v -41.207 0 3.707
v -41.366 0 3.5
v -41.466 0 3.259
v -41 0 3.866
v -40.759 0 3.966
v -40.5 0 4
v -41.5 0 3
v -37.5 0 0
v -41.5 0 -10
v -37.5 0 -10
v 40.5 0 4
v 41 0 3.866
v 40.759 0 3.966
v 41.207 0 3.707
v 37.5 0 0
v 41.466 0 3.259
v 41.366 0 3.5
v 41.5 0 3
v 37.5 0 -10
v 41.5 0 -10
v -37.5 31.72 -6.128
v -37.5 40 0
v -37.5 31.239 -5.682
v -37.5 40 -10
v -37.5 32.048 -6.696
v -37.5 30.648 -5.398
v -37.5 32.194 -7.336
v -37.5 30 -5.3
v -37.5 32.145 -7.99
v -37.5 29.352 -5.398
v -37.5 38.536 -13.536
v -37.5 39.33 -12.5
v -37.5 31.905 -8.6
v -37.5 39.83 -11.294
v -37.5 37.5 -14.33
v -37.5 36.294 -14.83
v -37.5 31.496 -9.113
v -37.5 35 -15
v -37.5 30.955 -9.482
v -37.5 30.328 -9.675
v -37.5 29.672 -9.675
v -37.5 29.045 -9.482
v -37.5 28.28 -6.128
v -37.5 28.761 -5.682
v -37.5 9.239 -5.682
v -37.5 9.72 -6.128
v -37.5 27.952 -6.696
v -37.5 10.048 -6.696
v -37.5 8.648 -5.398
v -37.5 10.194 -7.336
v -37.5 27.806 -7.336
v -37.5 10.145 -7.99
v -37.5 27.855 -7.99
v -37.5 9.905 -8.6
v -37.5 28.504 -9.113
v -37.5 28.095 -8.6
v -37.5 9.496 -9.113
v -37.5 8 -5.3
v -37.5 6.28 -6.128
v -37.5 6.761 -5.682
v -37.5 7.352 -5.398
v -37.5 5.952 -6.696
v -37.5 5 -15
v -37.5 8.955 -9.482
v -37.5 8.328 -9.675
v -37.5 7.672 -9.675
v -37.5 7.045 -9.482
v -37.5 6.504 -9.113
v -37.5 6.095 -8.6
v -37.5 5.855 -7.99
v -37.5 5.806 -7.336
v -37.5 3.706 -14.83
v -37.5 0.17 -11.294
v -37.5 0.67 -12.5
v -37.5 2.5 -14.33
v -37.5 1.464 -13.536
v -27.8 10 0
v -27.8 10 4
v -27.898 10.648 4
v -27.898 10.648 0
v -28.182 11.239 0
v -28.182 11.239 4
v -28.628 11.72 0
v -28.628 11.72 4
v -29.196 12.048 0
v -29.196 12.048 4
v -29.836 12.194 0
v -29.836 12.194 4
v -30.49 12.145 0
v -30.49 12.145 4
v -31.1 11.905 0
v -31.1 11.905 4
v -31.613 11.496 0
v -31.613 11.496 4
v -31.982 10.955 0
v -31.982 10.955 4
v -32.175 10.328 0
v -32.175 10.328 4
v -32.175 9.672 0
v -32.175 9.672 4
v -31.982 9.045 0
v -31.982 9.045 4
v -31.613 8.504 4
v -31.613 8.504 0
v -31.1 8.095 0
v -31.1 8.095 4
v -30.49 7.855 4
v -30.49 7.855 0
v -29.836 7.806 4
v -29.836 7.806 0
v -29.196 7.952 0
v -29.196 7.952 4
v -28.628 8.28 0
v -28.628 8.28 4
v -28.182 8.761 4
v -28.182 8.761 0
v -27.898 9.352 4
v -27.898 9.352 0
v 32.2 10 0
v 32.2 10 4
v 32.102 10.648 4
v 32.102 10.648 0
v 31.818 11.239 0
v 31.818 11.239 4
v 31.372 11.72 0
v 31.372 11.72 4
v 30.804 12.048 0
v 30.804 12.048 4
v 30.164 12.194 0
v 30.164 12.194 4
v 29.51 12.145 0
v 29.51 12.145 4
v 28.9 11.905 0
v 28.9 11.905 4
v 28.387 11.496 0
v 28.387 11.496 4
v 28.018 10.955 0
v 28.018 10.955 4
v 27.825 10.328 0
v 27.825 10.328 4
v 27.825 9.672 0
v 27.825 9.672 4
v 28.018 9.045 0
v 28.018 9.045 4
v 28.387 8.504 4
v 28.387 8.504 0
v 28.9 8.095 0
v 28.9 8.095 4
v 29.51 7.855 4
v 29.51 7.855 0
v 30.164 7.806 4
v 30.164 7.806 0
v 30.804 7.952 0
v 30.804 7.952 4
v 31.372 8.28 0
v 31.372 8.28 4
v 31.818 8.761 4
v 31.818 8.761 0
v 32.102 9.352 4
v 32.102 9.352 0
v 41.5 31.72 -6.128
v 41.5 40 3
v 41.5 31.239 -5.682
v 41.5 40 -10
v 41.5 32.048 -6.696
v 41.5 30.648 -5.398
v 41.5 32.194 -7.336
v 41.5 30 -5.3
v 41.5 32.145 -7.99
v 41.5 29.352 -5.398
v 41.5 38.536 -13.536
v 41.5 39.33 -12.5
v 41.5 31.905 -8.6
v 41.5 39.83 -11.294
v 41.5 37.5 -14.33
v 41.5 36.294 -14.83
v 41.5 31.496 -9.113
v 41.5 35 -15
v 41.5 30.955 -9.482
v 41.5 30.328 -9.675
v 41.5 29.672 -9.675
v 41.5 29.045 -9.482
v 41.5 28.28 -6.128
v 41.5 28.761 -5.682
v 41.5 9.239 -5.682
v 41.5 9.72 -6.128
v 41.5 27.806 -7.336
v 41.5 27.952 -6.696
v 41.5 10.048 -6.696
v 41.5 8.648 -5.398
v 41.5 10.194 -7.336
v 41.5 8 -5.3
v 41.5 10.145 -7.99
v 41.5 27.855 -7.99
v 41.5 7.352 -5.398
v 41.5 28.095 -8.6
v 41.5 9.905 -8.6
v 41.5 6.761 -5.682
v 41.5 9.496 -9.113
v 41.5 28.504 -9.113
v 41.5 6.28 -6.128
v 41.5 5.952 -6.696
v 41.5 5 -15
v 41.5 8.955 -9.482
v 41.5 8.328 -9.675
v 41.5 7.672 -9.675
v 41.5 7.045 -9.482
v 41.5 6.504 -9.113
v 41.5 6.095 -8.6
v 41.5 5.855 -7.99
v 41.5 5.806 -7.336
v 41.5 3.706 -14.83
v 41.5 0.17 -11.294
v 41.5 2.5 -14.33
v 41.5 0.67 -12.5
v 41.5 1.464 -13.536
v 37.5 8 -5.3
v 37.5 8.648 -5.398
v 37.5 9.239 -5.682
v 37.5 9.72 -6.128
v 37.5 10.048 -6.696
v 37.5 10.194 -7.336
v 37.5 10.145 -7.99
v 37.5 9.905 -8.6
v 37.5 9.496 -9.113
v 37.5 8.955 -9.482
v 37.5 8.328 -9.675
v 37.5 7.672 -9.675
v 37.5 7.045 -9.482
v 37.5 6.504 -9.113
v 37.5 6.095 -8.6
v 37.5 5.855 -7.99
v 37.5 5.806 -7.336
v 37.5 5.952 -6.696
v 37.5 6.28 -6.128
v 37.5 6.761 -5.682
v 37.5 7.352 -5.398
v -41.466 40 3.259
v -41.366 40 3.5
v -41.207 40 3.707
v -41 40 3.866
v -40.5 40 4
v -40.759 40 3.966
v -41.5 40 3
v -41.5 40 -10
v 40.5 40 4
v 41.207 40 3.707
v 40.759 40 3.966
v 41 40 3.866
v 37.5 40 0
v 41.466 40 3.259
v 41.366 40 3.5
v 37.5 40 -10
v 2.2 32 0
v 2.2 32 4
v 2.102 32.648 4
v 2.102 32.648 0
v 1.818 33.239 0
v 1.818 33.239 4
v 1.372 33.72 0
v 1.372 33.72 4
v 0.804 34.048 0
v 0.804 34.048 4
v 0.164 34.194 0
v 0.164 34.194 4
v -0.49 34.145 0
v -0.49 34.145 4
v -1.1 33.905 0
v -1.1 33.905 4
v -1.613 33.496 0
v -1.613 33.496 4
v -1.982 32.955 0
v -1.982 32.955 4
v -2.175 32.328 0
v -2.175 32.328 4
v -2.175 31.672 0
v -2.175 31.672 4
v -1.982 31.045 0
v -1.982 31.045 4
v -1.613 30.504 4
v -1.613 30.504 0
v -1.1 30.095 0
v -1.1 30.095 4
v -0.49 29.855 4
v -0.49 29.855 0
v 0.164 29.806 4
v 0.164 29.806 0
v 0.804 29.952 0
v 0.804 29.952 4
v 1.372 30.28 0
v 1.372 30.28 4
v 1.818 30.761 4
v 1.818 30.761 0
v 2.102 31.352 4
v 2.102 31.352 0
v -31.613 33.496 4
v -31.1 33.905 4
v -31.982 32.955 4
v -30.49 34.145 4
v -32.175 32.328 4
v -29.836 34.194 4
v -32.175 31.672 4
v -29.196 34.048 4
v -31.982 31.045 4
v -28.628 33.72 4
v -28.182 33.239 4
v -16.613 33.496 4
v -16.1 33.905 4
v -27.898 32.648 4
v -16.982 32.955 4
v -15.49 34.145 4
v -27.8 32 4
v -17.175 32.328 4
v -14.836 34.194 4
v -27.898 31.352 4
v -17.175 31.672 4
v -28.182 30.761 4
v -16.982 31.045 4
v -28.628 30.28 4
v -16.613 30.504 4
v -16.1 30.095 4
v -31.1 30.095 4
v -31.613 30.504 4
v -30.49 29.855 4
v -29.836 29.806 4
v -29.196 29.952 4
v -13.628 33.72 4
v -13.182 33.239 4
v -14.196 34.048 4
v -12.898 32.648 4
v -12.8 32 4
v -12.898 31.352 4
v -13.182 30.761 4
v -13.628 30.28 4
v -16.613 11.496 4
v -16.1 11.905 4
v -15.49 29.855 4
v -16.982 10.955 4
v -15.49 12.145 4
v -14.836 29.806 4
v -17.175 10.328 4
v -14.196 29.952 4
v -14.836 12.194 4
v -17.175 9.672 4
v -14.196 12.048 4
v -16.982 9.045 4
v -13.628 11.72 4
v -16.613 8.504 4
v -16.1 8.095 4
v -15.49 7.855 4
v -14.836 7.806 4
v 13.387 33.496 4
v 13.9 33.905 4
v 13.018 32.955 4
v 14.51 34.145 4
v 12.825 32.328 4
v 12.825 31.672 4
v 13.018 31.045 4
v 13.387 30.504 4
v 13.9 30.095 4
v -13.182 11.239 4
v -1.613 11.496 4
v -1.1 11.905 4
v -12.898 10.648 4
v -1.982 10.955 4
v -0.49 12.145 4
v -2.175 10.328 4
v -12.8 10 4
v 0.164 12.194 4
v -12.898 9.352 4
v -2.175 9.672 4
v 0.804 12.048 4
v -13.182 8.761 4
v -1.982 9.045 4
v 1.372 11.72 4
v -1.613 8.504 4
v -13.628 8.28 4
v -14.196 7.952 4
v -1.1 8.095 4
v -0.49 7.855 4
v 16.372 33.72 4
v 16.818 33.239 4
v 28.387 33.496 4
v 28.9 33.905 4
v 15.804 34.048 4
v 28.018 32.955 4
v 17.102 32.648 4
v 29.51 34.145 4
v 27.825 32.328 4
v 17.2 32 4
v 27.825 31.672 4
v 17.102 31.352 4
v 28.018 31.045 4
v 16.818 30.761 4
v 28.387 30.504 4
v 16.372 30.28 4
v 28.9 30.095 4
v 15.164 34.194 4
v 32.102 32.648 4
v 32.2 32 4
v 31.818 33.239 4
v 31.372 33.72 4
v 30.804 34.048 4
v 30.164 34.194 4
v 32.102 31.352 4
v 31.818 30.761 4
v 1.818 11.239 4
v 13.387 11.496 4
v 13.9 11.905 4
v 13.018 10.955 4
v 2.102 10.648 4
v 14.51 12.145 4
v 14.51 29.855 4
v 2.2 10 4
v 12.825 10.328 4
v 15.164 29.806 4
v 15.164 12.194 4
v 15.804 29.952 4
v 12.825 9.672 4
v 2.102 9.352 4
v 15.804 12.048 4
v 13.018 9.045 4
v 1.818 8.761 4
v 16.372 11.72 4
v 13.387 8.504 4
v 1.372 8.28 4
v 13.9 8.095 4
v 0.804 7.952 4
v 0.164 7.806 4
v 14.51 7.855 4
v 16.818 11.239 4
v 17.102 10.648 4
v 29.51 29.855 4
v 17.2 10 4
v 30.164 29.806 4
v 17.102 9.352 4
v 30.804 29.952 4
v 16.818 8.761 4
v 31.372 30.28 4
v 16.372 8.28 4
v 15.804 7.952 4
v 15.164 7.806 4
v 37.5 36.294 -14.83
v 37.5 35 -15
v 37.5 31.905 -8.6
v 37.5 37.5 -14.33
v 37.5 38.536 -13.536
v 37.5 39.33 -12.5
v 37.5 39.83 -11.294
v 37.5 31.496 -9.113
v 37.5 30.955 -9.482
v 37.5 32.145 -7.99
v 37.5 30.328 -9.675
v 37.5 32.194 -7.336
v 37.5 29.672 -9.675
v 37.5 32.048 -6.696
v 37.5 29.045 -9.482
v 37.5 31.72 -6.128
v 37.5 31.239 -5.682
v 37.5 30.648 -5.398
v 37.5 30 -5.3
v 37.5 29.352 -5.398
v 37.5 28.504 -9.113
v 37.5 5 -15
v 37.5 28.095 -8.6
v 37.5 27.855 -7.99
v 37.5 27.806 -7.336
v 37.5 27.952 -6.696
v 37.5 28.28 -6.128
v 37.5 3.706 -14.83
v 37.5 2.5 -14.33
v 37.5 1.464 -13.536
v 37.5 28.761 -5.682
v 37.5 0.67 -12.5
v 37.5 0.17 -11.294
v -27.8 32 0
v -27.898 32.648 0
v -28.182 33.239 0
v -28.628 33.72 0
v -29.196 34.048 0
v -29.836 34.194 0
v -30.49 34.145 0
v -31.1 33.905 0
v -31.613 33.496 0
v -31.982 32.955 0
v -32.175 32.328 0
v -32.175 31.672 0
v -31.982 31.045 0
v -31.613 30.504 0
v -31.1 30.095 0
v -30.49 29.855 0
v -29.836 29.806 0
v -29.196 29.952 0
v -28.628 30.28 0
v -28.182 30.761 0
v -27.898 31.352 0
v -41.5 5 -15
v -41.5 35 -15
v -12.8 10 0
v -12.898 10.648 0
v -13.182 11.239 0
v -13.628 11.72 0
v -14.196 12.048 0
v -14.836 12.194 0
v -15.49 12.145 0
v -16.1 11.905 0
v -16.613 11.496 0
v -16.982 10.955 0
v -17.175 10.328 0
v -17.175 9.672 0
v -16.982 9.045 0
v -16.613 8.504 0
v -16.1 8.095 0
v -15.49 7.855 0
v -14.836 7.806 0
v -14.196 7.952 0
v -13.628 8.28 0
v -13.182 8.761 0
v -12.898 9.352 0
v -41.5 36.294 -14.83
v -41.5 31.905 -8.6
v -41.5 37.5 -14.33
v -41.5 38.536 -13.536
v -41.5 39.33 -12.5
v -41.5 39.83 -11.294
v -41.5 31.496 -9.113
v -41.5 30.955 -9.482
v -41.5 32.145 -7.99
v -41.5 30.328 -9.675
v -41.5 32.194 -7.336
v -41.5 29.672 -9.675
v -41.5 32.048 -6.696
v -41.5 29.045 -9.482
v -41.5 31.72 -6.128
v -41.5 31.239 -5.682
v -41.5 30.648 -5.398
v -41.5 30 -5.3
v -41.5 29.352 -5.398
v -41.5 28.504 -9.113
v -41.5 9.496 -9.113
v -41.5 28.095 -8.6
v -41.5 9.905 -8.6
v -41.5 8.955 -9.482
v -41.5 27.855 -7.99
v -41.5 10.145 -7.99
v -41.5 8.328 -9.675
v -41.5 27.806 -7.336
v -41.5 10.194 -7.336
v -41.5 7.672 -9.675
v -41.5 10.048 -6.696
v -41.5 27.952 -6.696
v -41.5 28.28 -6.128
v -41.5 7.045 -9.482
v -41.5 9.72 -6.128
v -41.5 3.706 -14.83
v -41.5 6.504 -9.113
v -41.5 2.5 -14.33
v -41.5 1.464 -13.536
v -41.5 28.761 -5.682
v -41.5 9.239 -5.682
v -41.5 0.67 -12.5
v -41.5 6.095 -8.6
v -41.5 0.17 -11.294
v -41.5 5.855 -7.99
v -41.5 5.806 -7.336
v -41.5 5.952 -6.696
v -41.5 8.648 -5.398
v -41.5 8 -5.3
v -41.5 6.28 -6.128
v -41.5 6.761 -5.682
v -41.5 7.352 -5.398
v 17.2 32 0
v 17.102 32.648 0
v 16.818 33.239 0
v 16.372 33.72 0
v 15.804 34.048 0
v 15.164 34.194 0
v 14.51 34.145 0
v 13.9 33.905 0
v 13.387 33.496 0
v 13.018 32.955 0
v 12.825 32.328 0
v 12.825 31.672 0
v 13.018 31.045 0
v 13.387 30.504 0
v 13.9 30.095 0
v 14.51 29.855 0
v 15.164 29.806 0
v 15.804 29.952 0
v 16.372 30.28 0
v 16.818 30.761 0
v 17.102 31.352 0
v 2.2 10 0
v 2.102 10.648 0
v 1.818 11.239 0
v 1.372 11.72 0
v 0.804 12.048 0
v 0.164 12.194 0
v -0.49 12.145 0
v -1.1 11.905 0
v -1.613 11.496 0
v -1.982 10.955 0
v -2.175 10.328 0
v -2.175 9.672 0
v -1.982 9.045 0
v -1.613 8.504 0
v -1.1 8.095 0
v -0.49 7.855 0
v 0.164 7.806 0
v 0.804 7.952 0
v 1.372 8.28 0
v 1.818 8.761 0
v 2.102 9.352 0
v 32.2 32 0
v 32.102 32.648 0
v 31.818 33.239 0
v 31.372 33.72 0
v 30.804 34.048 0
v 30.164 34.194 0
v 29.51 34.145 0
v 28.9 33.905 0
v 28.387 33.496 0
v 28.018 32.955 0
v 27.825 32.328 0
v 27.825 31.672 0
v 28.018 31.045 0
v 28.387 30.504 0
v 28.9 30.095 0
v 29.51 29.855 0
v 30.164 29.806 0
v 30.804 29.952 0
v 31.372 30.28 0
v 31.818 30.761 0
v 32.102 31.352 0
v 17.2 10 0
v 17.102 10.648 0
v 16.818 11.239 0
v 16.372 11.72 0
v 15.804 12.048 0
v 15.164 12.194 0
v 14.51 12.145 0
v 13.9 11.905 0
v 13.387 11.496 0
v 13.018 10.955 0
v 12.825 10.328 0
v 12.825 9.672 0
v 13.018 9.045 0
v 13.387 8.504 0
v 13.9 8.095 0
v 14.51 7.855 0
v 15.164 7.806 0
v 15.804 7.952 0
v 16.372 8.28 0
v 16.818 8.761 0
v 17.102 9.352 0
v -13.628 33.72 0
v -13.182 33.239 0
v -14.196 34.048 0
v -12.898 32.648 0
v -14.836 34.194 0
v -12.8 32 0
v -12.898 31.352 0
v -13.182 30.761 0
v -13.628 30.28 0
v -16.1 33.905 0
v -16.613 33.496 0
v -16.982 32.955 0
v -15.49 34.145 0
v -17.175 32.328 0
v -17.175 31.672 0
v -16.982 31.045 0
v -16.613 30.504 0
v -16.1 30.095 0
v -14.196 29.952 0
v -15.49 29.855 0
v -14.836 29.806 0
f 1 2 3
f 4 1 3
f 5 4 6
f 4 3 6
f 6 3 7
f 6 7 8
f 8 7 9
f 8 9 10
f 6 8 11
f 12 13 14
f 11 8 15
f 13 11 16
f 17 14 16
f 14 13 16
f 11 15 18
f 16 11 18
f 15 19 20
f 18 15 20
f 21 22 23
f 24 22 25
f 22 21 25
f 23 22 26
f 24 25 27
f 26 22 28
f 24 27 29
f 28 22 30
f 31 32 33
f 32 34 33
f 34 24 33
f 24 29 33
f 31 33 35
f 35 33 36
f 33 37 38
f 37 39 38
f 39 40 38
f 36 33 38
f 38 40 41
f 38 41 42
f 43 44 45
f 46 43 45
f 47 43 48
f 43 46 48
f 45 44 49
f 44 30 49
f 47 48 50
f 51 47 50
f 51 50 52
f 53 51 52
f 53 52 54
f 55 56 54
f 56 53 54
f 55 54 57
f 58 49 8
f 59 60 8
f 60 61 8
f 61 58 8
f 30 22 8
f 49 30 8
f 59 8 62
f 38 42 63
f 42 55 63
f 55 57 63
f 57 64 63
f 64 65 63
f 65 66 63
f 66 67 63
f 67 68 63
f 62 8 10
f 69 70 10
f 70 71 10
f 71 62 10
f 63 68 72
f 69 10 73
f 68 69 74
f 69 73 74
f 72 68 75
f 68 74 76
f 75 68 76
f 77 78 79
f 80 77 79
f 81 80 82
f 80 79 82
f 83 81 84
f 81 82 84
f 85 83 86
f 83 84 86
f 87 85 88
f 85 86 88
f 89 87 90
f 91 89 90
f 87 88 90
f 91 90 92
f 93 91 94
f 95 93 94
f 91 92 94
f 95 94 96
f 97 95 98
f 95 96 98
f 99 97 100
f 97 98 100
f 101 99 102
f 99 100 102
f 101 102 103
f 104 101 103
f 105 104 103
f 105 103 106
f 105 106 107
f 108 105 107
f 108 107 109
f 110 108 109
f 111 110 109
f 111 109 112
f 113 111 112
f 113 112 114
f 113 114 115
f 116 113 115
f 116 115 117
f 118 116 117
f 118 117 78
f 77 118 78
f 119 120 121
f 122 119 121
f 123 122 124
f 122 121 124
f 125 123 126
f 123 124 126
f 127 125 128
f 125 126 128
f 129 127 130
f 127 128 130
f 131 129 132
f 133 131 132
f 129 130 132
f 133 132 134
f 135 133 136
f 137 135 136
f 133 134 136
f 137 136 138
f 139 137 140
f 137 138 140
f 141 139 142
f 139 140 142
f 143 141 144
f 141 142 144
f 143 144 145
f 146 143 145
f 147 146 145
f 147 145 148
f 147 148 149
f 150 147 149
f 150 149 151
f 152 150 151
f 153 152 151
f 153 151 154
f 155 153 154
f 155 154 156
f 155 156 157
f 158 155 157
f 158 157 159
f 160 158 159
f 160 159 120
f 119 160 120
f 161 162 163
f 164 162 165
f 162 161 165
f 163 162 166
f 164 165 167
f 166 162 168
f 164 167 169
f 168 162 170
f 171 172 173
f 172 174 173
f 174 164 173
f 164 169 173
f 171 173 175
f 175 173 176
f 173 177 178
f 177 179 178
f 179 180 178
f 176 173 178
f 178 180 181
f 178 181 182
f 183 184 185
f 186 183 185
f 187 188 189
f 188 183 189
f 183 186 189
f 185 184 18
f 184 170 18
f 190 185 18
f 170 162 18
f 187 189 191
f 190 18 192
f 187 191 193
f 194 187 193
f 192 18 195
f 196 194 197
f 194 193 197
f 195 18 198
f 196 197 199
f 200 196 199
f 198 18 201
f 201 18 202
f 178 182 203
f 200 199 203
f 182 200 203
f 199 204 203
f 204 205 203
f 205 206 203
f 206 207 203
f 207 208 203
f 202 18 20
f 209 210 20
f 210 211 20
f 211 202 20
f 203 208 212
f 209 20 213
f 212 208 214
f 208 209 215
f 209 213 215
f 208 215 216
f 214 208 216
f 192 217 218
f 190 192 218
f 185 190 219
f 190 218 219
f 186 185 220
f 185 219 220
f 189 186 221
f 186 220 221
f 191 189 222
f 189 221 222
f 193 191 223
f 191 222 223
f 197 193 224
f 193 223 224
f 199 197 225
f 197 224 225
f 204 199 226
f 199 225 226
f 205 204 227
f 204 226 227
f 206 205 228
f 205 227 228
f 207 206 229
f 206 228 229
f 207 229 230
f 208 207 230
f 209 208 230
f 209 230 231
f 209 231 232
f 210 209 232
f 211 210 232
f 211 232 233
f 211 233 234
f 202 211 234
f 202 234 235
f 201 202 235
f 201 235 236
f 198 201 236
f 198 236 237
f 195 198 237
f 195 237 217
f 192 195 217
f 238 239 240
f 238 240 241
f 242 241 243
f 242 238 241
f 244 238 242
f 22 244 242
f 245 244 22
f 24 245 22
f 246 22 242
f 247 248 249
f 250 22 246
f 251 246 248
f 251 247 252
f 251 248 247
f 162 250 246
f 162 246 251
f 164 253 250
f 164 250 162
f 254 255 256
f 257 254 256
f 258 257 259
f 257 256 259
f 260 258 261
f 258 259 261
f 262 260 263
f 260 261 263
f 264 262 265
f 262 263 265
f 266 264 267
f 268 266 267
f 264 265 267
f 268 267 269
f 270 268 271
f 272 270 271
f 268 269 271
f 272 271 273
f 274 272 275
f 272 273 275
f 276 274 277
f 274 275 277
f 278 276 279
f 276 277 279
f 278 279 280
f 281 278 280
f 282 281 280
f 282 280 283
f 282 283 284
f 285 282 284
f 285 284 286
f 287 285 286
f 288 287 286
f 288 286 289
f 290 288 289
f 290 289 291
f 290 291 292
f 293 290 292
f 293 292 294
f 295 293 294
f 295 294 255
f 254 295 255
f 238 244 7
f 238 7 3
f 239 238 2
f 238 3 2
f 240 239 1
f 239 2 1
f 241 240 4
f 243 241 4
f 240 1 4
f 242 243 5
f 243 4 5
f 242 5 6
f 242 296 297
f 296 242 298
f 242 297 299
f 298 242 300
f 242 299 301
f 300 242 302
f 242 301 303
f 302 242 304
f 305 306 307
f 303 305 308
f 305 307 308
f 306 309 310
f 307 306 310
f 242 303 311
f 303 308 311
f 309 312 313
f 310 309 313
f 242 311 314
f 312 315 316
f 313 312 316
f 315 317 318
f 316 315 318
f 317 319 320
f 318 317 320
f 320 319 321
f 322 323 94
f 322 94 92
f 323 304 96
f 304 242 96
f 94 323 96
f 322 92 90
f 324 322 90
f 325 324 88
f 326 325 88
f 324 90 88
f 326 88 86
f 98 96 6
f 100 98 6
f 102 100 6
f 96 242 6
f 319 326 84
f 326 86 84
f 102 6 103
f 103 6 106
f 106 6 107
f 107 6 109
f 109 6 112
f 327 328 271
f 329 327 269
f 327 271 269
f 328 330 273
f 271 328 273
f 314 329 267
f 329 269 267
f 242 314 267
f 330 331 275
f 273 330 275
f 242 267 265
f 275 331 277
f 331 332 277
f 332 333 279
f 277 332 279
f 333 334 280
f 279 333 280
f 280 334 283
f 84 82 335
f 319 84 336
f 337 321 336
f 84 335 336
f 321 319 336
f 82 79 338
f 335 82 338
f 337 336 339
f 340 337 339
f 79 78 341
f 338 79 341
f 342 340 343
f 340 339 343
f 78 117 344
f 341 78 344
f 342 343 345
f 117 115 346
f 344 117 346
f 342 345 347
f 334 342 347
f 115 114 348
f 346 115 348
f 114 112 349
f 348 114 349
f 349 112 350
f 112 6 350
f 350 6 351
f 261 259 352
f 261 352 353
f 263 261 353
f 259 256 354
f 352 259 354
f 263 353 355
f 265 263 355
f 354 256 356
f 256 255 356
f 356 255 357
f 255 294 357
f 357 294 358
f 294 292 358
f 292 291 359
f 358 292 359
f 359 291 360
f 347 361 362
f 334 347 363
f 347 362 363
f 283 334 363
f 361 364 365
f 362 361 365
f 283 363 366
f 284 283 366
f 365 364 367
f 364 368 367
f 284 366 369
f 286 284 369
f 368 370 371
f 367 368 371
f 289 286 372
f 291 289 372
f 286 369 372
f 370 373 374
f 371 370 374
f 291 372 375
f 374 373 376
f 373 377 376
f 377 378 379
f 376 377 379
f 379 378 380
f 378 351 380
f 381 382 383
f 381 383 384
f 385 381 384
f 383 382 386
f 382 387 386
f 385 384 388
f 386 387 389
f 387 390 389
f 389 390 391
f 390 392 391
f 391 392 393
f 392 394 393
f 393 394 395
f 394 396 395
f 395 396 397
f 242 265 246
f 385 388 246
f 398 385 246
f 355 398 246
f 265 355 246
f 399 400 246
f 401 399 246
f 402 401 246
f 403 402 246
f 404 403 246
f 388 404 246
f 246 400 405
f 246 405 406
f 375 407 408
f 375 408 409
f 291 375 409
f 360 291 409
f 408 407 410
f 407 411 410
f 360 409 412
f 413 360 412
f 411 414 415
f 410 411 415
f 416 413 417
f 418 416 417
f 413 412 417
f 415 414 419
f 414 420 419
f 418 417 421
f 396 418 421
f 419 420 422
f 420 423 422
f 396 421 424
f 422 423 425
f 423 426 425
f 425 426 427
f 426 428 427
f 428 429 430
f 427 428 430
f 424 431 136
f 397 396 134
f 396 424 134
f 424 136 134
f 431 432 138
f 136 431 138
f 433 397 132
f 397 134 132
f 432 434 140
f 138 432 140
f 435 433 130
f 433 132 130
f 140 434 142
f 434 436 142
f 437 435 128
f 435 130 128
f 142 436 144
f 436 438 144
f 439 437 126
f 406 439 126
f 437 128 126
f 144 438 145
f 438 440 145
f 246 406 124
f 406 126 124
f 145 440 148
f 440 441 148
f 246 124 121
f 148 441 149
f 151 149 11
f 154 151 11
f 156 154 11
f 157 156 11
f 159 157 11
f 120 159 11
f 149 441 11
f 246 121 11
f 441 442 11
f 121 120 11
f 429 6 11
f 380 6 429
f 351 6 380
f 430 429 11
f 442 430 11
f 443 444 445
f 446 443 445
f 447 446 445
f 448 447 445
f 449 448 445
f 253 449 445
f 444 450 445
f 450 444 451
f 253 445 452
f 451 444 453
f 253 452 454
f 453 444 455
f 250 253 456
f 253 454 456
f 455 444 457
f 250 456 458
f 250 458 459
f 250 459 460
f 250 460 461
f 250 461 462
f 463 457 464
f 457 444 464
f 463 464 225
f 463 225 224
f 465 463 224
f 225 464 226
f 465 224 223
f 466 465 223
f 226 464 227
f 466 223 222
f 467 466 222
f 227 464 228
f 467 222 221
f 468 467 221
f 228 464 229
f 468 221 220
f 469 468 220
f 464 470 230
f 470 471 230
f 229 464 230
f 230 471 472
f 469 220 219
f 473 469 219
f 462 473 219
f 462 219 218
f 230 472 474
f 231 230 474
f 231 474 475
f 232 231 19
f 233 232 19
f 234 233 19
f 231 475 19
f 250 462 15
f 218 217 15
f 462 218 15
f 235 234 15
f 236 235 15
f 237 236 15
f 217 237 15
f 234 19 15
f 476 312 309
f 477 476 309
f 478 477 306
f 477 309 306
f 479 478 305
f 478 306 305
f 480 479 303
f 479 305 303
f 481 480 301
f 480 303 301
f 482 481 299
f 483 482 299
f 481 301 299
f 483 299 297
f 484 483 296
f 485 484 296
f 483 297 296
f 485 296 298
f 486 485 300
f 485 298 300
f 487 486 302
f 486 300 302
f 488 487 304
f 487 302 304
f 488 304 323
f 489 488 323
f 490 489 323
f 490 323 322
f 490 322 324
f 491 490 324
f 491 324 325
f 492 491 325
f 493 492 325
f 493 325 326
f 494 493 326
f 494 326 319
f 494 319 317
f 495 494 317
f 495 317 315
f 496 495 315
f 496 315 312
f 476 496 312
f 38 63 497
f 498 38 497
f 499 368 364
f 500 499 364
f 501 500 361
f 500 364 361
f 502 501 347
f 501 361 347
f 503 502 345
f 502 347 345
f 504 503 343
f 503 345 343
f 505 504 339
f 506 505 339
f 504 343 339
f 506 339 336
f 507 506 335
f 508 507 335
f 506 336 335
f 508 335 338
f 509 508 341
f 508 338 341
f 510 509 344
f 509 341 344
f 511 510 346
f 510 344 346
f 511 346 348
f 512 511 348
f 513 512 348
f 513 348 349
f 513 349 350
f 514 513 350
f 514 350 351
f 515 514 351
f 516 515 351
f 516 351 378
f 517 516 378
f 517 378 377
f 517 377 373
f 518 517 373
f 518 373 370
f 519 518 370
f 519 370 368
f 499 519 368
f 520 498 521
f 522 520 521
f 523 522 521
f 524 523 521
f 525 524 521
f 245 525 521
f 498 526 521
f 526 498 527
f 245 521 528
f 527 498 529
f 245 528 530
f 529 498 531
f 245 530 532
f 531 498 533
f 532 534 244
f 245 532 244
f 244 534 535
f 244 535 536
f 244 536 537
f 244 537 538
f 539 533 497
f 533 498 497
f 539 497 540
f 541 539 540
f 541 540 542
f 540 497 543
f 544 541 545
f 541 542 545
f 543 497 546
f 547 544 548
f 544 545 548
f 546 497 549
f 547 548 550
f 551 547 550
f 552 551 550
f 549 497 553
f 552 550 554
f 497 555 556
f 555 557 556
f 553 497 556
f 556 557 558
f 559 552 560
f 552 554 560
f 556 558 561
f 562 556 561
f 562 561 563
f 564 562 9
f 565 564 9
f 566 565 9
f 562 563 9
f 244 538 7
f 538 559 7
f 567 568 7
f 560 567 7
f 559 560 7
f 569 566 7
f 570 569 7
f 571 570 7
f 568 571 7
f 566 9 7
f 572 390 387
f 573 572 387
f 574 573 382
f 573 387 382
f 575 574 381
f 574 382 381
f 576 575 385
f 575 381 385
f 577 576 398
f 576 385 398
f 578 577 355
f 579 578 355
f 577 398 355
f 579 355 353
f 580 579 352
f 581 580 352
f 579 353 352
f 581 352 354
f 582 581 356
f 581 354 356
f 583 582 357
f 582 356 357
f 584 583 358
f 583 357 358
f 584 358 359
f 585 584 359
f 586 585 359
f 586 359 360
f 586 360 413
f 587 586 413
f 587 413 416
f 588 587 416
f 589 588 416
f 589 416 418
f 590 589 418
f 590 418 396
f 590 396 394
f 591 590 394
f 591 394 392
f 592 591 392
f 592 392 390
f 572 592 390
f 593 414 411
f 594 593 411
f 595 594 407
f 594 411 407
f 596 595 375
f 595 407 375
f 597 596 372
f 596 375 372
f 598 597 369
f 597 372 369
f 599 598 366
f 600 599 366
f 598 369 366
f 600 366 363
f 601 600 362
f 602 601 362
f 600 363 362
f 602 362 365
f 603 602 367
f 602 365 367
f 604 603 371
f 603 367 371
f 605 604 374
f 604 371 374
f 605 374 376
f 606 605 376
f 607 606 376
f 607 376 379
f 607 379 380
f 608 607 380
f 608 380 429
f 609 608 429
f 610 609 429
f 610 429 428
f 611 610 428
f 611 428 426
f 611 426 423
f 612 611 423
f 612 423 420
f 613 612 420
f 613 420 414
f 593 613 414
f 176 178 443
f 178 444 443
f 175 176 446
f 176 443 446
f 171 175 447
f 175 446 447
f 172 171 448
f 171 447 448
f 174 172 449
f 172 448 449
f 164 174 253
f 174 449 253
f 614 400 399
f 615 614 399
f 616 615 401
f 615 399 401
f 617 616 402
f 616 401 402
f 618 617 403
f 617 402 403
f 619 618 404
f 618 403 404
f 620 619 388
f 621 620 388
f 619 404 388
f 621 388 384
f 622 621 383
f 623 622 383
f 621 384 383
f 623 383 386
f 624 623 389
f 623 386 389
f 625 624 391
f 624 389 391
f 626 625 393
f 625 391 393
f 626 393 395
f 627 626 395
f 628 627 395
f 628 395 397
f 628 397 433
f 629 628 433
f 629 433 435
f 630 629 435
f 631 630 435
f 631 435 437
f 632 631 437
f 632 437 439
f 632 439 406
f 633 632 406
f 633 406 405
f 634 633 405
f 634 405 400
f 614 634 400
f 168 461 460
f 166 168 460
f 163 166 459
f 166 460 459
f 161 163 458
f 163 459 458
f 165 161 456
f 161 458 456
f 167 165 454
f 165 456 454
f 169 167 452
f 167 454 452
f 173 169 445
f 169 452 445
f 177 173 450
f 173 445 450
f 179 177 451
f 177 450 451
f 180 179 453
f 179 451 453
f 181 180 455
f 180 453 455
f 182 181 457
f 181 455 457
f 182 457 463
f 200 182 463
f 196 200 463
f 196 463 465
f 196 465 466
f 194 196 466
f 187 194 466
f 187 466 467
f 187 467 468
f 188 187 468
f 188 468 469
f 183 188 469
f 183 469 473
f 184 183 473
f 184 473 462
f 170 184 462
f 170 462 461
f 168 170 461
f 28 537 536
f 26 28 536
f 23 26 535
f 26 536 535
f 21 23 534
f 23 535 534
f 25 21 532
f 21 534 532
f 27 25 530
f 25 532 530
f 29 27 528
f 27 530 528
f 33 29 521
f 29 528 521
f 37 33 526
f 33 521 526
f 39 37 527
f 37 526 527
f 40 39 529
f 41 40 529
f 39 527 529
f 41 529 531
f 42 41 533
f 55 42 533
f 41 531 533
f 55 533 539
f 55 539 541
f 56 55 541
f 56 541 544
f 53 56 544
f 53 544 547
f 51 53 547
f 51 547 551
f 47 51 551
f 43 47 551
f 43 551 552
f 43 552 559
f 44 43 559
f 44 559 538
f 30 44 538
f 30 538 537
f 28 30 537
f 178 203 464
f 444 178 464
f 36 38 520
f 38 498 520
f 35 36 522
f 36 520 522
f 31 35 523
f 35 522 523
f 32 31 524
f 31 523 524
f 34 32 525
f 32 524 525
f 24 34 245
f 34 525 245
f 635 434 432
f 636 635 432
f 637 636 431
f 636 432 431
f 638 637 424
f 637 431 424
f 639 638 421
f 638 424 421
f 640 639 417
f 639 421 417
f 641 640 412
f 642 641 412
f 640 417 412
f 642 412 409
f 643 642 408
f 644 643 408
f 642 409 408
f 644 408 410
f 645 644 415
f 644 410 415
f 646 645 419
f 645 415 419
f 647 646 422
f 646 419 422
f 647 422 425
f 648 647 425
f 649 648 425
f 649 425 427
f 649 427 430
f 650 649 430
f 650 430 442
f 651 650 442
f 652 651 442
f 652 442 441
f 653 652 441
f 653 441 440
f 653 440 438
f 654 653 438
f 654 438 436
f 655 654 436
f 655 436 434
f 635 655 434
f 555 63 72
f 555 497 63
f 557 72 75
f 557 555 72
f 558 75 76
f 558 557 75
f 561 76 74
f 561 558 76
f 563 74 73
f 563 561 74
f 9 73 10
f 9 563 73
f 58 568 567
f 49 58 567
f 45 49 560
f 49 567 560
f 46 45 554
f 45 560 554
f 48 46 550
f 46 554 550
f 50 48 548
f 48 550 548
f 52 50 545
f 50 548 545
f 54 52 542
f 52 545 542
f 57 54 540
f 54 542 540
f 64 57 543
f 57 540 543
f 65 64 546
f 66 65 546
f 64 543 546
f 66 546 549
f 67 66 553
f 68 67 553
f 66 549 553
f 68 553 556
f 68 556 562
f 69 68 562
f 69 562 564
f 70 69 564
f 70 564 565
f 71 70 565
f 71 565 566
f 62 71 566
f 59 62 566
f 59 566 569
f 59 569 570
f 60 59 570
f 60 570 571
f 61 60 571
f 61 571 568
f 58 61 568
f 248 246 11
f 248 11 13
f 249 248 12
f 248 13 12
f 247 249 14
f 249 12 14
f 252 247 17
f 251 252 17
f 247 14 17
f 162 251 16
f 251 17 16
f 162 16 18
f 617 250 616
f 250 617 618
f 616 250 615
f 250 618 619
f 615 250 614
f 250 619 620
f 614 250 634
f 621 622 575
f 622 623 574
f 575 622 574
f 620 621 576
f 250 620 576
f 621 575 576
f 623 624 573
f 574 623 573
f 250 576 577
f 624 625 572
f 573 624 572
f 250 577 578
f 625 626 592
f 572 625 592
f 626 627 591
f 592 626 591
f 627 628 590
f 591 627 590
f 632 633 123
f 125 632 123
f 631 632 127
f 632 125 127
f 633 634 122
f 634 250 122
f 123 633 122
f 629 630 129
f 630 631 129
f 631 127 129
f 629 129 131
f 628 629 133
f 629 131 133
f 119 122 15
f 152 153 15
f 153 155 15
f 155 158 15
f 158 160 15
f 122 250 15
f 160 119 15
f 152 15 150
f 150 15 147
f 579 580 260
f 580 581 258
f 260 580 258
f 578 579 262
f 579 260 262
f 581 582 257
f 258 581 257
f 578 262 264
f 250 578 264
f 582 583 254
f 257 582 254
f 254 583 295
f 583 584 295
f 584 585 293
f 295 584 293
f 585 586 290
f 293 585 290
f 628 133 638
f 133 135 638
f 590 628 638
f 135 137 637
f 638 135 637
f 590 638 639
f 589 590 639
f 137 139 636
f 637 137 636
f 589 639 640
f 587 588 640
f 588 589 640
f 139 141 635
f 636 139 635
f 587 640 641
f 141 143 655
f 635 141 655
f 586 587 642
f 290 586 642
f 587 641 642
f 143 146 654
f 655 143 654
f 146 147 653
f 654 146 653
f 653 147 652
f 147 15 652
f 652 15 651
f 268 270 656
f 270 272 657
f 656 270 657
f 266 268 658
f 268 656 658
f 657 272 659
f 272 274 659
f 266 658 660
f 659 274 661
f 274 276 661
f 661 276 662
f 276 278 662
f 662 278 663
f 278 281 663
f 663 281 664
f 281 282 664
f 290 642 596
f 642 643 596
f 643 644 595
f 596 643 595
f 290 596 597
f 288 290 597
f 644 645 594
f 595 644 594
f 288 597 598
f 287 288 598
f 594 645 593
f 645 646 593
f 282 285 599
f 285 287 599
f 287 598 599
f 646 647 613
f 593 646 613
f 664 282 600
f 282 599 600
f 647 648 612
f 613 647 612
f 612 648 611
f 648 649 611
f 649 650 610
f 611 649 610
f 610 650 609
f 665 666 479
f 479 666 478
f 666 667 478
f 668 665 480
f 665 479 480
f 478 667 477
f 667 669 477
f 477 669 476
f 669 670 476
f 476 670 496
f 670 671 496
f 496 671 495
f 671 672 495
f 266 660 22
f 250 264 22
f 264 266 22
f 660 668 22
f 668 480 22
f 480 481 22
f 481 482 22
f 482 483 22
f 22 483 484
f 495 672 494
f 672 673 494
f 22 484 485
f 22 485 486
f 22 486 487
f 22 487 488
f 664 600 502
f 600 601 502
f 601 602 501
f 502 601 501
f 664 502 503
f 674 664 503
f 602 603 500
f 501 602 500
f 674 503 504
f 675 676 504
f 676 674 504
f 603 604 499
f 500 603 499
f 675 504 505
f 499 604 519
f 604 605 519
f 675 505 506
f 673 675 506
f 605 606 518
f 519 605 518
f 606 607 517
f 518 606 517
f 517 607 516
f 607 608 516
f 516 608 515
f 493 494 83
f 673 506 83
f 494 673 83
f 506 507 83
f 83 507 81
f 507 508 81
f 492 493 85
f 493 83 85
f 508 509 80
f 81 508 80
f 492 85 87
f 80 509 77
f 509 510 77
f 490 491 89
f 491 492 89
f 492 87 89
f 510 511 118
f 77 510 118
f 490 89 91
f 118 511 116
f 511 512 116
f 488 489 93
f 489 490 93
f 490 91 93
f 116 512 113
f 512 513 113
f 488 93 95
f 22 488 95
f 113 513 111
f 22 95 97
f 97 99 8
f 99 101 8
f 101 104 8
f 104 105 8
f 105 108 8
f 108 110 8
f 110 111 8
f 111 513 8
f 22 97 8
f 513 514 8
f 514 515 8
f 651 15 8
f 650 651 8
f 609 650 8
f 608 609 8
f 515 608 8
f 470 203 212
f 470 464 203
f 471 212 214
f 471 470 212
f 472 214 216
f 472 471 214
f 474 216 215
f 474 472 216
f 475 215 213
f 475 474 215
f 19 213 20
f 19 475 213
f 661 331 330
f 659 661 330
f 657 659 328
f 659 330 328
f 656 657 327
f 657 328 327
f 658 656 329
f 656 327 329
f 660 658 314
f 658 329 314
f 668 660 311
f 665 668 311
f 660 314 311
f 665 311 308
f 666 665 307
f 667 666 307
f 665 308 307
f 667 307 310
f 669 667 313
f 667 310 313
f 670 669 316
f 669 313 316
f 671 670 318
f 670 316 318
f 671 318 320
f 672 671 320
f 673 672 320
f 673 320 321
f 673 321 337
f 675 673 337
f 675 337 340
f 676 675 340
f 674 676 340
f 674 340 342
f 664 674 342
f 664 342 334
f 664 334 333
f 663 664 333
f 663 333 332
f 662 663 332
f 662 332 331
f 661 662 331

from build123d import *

# Parameters (mm, degrees)
BOSS_EXTRUDE1_DEPTH = 40
FILLET1_R           = 5
SKETCH2_R           = 2.2
CUT_EXTRUDE1_DEPTH  = 40
SKETCH3_R           = 2.2
CUT_EXTRUDE2_DEPTH  = 94


with BuildPart() as part:
    # Sketch1 → Boss-Extrude1 (new body)
    with BuildSketch(Plane(origin=(0, 0, 0), x_dir=(1, 0, 0), z_dir=(0, 1, 0))):
        with BuildLine():
            Line((36.5, 0), (-36.5, 0))
            Line((-36.5, 0), (-37.5, 0))
            Line((-37.5, 0), (-37.5, 1))
            Line((-37.5, 1), (-37.5, 15))
            Line((-37.5, 15), (-41.5, 15))
            Line((-41.5, 15), (-41.5, -3))
            ThreePointArc((-41.5, -3), (-41.207106781, -3.707106781), (-40.5, -4))
            Line((-40.5, -4), (40.5, -4))
            ThreePointArc((40.5, -4), (41.207106781, -3.707106781), (41.5, -3))
            Line((41.5, -3), (41.5, 15))
            Line((41.5, 15), (37.5, 15))
            Line((37.5, 15), (37.5, 1))
            Line((37.5, 1), (37.5, 0))
            Line((37.5, 0), (36.5, 0))
        make_face()
    extrude(amount=BOSS_EXTRUDE1_DEPTH)

    # Fillet1
    fillet1_edges = [part.edges().sort_by_distance(p)[0] for p in [
        (39.5, 0, -15),
        (-39.5, 0, -15),
        (39.5, 40, -15),
        (-39.5, 40, -15),
    ]]
    fillet(fillet1_edges, radius=FILLET1_R)

    # Sketch2 → Cut-Extrude1 (cut)
    with BuildSketch(Plane.XY.offset(4)):
        with Locations((-30, 32)):
            Circle(SKETCH2_R)
        with Locations((-15, 32)):
            Circle(SKETCH2_R)
        with Locations((0, 32)):
            Circle(SKETCH2_R)
        with Locations((15, 32)):
            Circle(SKETCH2_R)
        with Locations((30, 32)):
            Circle(SKETCH2_R)
        with Locations((-30, 10)):
            Circle(SKETCH2_R)
        with Locations((-15, 10)):
            Circle(SKETCH2_R)
        with Locations((0, 10)):
            Circle(SKETCH2_R)
        with Locations((15, 10)):
            Circle(SKETCH2_R)
        with Locations((30, 10)):
            Circle(SKETCH2_R)
    extrude(amount=-CUT_EXTRUDE1_DEPTH, mode=Mode.SUBTRACT)

    # Sketch3 → Cut-Extrude2 (cut)
    with BuildSketch(Plane.ZY.offset(41.5)):
        with Locations((-7.5, 30)):
            Circle(SKETCH3_R)
        with Locations((-7.5, 8)):
            Circle(SKETCH3_R)
    extrude(amount=-CUT_EXTRUDE2_DEPTH, mode=Mode.SUBTRACT)


solid = part.part
